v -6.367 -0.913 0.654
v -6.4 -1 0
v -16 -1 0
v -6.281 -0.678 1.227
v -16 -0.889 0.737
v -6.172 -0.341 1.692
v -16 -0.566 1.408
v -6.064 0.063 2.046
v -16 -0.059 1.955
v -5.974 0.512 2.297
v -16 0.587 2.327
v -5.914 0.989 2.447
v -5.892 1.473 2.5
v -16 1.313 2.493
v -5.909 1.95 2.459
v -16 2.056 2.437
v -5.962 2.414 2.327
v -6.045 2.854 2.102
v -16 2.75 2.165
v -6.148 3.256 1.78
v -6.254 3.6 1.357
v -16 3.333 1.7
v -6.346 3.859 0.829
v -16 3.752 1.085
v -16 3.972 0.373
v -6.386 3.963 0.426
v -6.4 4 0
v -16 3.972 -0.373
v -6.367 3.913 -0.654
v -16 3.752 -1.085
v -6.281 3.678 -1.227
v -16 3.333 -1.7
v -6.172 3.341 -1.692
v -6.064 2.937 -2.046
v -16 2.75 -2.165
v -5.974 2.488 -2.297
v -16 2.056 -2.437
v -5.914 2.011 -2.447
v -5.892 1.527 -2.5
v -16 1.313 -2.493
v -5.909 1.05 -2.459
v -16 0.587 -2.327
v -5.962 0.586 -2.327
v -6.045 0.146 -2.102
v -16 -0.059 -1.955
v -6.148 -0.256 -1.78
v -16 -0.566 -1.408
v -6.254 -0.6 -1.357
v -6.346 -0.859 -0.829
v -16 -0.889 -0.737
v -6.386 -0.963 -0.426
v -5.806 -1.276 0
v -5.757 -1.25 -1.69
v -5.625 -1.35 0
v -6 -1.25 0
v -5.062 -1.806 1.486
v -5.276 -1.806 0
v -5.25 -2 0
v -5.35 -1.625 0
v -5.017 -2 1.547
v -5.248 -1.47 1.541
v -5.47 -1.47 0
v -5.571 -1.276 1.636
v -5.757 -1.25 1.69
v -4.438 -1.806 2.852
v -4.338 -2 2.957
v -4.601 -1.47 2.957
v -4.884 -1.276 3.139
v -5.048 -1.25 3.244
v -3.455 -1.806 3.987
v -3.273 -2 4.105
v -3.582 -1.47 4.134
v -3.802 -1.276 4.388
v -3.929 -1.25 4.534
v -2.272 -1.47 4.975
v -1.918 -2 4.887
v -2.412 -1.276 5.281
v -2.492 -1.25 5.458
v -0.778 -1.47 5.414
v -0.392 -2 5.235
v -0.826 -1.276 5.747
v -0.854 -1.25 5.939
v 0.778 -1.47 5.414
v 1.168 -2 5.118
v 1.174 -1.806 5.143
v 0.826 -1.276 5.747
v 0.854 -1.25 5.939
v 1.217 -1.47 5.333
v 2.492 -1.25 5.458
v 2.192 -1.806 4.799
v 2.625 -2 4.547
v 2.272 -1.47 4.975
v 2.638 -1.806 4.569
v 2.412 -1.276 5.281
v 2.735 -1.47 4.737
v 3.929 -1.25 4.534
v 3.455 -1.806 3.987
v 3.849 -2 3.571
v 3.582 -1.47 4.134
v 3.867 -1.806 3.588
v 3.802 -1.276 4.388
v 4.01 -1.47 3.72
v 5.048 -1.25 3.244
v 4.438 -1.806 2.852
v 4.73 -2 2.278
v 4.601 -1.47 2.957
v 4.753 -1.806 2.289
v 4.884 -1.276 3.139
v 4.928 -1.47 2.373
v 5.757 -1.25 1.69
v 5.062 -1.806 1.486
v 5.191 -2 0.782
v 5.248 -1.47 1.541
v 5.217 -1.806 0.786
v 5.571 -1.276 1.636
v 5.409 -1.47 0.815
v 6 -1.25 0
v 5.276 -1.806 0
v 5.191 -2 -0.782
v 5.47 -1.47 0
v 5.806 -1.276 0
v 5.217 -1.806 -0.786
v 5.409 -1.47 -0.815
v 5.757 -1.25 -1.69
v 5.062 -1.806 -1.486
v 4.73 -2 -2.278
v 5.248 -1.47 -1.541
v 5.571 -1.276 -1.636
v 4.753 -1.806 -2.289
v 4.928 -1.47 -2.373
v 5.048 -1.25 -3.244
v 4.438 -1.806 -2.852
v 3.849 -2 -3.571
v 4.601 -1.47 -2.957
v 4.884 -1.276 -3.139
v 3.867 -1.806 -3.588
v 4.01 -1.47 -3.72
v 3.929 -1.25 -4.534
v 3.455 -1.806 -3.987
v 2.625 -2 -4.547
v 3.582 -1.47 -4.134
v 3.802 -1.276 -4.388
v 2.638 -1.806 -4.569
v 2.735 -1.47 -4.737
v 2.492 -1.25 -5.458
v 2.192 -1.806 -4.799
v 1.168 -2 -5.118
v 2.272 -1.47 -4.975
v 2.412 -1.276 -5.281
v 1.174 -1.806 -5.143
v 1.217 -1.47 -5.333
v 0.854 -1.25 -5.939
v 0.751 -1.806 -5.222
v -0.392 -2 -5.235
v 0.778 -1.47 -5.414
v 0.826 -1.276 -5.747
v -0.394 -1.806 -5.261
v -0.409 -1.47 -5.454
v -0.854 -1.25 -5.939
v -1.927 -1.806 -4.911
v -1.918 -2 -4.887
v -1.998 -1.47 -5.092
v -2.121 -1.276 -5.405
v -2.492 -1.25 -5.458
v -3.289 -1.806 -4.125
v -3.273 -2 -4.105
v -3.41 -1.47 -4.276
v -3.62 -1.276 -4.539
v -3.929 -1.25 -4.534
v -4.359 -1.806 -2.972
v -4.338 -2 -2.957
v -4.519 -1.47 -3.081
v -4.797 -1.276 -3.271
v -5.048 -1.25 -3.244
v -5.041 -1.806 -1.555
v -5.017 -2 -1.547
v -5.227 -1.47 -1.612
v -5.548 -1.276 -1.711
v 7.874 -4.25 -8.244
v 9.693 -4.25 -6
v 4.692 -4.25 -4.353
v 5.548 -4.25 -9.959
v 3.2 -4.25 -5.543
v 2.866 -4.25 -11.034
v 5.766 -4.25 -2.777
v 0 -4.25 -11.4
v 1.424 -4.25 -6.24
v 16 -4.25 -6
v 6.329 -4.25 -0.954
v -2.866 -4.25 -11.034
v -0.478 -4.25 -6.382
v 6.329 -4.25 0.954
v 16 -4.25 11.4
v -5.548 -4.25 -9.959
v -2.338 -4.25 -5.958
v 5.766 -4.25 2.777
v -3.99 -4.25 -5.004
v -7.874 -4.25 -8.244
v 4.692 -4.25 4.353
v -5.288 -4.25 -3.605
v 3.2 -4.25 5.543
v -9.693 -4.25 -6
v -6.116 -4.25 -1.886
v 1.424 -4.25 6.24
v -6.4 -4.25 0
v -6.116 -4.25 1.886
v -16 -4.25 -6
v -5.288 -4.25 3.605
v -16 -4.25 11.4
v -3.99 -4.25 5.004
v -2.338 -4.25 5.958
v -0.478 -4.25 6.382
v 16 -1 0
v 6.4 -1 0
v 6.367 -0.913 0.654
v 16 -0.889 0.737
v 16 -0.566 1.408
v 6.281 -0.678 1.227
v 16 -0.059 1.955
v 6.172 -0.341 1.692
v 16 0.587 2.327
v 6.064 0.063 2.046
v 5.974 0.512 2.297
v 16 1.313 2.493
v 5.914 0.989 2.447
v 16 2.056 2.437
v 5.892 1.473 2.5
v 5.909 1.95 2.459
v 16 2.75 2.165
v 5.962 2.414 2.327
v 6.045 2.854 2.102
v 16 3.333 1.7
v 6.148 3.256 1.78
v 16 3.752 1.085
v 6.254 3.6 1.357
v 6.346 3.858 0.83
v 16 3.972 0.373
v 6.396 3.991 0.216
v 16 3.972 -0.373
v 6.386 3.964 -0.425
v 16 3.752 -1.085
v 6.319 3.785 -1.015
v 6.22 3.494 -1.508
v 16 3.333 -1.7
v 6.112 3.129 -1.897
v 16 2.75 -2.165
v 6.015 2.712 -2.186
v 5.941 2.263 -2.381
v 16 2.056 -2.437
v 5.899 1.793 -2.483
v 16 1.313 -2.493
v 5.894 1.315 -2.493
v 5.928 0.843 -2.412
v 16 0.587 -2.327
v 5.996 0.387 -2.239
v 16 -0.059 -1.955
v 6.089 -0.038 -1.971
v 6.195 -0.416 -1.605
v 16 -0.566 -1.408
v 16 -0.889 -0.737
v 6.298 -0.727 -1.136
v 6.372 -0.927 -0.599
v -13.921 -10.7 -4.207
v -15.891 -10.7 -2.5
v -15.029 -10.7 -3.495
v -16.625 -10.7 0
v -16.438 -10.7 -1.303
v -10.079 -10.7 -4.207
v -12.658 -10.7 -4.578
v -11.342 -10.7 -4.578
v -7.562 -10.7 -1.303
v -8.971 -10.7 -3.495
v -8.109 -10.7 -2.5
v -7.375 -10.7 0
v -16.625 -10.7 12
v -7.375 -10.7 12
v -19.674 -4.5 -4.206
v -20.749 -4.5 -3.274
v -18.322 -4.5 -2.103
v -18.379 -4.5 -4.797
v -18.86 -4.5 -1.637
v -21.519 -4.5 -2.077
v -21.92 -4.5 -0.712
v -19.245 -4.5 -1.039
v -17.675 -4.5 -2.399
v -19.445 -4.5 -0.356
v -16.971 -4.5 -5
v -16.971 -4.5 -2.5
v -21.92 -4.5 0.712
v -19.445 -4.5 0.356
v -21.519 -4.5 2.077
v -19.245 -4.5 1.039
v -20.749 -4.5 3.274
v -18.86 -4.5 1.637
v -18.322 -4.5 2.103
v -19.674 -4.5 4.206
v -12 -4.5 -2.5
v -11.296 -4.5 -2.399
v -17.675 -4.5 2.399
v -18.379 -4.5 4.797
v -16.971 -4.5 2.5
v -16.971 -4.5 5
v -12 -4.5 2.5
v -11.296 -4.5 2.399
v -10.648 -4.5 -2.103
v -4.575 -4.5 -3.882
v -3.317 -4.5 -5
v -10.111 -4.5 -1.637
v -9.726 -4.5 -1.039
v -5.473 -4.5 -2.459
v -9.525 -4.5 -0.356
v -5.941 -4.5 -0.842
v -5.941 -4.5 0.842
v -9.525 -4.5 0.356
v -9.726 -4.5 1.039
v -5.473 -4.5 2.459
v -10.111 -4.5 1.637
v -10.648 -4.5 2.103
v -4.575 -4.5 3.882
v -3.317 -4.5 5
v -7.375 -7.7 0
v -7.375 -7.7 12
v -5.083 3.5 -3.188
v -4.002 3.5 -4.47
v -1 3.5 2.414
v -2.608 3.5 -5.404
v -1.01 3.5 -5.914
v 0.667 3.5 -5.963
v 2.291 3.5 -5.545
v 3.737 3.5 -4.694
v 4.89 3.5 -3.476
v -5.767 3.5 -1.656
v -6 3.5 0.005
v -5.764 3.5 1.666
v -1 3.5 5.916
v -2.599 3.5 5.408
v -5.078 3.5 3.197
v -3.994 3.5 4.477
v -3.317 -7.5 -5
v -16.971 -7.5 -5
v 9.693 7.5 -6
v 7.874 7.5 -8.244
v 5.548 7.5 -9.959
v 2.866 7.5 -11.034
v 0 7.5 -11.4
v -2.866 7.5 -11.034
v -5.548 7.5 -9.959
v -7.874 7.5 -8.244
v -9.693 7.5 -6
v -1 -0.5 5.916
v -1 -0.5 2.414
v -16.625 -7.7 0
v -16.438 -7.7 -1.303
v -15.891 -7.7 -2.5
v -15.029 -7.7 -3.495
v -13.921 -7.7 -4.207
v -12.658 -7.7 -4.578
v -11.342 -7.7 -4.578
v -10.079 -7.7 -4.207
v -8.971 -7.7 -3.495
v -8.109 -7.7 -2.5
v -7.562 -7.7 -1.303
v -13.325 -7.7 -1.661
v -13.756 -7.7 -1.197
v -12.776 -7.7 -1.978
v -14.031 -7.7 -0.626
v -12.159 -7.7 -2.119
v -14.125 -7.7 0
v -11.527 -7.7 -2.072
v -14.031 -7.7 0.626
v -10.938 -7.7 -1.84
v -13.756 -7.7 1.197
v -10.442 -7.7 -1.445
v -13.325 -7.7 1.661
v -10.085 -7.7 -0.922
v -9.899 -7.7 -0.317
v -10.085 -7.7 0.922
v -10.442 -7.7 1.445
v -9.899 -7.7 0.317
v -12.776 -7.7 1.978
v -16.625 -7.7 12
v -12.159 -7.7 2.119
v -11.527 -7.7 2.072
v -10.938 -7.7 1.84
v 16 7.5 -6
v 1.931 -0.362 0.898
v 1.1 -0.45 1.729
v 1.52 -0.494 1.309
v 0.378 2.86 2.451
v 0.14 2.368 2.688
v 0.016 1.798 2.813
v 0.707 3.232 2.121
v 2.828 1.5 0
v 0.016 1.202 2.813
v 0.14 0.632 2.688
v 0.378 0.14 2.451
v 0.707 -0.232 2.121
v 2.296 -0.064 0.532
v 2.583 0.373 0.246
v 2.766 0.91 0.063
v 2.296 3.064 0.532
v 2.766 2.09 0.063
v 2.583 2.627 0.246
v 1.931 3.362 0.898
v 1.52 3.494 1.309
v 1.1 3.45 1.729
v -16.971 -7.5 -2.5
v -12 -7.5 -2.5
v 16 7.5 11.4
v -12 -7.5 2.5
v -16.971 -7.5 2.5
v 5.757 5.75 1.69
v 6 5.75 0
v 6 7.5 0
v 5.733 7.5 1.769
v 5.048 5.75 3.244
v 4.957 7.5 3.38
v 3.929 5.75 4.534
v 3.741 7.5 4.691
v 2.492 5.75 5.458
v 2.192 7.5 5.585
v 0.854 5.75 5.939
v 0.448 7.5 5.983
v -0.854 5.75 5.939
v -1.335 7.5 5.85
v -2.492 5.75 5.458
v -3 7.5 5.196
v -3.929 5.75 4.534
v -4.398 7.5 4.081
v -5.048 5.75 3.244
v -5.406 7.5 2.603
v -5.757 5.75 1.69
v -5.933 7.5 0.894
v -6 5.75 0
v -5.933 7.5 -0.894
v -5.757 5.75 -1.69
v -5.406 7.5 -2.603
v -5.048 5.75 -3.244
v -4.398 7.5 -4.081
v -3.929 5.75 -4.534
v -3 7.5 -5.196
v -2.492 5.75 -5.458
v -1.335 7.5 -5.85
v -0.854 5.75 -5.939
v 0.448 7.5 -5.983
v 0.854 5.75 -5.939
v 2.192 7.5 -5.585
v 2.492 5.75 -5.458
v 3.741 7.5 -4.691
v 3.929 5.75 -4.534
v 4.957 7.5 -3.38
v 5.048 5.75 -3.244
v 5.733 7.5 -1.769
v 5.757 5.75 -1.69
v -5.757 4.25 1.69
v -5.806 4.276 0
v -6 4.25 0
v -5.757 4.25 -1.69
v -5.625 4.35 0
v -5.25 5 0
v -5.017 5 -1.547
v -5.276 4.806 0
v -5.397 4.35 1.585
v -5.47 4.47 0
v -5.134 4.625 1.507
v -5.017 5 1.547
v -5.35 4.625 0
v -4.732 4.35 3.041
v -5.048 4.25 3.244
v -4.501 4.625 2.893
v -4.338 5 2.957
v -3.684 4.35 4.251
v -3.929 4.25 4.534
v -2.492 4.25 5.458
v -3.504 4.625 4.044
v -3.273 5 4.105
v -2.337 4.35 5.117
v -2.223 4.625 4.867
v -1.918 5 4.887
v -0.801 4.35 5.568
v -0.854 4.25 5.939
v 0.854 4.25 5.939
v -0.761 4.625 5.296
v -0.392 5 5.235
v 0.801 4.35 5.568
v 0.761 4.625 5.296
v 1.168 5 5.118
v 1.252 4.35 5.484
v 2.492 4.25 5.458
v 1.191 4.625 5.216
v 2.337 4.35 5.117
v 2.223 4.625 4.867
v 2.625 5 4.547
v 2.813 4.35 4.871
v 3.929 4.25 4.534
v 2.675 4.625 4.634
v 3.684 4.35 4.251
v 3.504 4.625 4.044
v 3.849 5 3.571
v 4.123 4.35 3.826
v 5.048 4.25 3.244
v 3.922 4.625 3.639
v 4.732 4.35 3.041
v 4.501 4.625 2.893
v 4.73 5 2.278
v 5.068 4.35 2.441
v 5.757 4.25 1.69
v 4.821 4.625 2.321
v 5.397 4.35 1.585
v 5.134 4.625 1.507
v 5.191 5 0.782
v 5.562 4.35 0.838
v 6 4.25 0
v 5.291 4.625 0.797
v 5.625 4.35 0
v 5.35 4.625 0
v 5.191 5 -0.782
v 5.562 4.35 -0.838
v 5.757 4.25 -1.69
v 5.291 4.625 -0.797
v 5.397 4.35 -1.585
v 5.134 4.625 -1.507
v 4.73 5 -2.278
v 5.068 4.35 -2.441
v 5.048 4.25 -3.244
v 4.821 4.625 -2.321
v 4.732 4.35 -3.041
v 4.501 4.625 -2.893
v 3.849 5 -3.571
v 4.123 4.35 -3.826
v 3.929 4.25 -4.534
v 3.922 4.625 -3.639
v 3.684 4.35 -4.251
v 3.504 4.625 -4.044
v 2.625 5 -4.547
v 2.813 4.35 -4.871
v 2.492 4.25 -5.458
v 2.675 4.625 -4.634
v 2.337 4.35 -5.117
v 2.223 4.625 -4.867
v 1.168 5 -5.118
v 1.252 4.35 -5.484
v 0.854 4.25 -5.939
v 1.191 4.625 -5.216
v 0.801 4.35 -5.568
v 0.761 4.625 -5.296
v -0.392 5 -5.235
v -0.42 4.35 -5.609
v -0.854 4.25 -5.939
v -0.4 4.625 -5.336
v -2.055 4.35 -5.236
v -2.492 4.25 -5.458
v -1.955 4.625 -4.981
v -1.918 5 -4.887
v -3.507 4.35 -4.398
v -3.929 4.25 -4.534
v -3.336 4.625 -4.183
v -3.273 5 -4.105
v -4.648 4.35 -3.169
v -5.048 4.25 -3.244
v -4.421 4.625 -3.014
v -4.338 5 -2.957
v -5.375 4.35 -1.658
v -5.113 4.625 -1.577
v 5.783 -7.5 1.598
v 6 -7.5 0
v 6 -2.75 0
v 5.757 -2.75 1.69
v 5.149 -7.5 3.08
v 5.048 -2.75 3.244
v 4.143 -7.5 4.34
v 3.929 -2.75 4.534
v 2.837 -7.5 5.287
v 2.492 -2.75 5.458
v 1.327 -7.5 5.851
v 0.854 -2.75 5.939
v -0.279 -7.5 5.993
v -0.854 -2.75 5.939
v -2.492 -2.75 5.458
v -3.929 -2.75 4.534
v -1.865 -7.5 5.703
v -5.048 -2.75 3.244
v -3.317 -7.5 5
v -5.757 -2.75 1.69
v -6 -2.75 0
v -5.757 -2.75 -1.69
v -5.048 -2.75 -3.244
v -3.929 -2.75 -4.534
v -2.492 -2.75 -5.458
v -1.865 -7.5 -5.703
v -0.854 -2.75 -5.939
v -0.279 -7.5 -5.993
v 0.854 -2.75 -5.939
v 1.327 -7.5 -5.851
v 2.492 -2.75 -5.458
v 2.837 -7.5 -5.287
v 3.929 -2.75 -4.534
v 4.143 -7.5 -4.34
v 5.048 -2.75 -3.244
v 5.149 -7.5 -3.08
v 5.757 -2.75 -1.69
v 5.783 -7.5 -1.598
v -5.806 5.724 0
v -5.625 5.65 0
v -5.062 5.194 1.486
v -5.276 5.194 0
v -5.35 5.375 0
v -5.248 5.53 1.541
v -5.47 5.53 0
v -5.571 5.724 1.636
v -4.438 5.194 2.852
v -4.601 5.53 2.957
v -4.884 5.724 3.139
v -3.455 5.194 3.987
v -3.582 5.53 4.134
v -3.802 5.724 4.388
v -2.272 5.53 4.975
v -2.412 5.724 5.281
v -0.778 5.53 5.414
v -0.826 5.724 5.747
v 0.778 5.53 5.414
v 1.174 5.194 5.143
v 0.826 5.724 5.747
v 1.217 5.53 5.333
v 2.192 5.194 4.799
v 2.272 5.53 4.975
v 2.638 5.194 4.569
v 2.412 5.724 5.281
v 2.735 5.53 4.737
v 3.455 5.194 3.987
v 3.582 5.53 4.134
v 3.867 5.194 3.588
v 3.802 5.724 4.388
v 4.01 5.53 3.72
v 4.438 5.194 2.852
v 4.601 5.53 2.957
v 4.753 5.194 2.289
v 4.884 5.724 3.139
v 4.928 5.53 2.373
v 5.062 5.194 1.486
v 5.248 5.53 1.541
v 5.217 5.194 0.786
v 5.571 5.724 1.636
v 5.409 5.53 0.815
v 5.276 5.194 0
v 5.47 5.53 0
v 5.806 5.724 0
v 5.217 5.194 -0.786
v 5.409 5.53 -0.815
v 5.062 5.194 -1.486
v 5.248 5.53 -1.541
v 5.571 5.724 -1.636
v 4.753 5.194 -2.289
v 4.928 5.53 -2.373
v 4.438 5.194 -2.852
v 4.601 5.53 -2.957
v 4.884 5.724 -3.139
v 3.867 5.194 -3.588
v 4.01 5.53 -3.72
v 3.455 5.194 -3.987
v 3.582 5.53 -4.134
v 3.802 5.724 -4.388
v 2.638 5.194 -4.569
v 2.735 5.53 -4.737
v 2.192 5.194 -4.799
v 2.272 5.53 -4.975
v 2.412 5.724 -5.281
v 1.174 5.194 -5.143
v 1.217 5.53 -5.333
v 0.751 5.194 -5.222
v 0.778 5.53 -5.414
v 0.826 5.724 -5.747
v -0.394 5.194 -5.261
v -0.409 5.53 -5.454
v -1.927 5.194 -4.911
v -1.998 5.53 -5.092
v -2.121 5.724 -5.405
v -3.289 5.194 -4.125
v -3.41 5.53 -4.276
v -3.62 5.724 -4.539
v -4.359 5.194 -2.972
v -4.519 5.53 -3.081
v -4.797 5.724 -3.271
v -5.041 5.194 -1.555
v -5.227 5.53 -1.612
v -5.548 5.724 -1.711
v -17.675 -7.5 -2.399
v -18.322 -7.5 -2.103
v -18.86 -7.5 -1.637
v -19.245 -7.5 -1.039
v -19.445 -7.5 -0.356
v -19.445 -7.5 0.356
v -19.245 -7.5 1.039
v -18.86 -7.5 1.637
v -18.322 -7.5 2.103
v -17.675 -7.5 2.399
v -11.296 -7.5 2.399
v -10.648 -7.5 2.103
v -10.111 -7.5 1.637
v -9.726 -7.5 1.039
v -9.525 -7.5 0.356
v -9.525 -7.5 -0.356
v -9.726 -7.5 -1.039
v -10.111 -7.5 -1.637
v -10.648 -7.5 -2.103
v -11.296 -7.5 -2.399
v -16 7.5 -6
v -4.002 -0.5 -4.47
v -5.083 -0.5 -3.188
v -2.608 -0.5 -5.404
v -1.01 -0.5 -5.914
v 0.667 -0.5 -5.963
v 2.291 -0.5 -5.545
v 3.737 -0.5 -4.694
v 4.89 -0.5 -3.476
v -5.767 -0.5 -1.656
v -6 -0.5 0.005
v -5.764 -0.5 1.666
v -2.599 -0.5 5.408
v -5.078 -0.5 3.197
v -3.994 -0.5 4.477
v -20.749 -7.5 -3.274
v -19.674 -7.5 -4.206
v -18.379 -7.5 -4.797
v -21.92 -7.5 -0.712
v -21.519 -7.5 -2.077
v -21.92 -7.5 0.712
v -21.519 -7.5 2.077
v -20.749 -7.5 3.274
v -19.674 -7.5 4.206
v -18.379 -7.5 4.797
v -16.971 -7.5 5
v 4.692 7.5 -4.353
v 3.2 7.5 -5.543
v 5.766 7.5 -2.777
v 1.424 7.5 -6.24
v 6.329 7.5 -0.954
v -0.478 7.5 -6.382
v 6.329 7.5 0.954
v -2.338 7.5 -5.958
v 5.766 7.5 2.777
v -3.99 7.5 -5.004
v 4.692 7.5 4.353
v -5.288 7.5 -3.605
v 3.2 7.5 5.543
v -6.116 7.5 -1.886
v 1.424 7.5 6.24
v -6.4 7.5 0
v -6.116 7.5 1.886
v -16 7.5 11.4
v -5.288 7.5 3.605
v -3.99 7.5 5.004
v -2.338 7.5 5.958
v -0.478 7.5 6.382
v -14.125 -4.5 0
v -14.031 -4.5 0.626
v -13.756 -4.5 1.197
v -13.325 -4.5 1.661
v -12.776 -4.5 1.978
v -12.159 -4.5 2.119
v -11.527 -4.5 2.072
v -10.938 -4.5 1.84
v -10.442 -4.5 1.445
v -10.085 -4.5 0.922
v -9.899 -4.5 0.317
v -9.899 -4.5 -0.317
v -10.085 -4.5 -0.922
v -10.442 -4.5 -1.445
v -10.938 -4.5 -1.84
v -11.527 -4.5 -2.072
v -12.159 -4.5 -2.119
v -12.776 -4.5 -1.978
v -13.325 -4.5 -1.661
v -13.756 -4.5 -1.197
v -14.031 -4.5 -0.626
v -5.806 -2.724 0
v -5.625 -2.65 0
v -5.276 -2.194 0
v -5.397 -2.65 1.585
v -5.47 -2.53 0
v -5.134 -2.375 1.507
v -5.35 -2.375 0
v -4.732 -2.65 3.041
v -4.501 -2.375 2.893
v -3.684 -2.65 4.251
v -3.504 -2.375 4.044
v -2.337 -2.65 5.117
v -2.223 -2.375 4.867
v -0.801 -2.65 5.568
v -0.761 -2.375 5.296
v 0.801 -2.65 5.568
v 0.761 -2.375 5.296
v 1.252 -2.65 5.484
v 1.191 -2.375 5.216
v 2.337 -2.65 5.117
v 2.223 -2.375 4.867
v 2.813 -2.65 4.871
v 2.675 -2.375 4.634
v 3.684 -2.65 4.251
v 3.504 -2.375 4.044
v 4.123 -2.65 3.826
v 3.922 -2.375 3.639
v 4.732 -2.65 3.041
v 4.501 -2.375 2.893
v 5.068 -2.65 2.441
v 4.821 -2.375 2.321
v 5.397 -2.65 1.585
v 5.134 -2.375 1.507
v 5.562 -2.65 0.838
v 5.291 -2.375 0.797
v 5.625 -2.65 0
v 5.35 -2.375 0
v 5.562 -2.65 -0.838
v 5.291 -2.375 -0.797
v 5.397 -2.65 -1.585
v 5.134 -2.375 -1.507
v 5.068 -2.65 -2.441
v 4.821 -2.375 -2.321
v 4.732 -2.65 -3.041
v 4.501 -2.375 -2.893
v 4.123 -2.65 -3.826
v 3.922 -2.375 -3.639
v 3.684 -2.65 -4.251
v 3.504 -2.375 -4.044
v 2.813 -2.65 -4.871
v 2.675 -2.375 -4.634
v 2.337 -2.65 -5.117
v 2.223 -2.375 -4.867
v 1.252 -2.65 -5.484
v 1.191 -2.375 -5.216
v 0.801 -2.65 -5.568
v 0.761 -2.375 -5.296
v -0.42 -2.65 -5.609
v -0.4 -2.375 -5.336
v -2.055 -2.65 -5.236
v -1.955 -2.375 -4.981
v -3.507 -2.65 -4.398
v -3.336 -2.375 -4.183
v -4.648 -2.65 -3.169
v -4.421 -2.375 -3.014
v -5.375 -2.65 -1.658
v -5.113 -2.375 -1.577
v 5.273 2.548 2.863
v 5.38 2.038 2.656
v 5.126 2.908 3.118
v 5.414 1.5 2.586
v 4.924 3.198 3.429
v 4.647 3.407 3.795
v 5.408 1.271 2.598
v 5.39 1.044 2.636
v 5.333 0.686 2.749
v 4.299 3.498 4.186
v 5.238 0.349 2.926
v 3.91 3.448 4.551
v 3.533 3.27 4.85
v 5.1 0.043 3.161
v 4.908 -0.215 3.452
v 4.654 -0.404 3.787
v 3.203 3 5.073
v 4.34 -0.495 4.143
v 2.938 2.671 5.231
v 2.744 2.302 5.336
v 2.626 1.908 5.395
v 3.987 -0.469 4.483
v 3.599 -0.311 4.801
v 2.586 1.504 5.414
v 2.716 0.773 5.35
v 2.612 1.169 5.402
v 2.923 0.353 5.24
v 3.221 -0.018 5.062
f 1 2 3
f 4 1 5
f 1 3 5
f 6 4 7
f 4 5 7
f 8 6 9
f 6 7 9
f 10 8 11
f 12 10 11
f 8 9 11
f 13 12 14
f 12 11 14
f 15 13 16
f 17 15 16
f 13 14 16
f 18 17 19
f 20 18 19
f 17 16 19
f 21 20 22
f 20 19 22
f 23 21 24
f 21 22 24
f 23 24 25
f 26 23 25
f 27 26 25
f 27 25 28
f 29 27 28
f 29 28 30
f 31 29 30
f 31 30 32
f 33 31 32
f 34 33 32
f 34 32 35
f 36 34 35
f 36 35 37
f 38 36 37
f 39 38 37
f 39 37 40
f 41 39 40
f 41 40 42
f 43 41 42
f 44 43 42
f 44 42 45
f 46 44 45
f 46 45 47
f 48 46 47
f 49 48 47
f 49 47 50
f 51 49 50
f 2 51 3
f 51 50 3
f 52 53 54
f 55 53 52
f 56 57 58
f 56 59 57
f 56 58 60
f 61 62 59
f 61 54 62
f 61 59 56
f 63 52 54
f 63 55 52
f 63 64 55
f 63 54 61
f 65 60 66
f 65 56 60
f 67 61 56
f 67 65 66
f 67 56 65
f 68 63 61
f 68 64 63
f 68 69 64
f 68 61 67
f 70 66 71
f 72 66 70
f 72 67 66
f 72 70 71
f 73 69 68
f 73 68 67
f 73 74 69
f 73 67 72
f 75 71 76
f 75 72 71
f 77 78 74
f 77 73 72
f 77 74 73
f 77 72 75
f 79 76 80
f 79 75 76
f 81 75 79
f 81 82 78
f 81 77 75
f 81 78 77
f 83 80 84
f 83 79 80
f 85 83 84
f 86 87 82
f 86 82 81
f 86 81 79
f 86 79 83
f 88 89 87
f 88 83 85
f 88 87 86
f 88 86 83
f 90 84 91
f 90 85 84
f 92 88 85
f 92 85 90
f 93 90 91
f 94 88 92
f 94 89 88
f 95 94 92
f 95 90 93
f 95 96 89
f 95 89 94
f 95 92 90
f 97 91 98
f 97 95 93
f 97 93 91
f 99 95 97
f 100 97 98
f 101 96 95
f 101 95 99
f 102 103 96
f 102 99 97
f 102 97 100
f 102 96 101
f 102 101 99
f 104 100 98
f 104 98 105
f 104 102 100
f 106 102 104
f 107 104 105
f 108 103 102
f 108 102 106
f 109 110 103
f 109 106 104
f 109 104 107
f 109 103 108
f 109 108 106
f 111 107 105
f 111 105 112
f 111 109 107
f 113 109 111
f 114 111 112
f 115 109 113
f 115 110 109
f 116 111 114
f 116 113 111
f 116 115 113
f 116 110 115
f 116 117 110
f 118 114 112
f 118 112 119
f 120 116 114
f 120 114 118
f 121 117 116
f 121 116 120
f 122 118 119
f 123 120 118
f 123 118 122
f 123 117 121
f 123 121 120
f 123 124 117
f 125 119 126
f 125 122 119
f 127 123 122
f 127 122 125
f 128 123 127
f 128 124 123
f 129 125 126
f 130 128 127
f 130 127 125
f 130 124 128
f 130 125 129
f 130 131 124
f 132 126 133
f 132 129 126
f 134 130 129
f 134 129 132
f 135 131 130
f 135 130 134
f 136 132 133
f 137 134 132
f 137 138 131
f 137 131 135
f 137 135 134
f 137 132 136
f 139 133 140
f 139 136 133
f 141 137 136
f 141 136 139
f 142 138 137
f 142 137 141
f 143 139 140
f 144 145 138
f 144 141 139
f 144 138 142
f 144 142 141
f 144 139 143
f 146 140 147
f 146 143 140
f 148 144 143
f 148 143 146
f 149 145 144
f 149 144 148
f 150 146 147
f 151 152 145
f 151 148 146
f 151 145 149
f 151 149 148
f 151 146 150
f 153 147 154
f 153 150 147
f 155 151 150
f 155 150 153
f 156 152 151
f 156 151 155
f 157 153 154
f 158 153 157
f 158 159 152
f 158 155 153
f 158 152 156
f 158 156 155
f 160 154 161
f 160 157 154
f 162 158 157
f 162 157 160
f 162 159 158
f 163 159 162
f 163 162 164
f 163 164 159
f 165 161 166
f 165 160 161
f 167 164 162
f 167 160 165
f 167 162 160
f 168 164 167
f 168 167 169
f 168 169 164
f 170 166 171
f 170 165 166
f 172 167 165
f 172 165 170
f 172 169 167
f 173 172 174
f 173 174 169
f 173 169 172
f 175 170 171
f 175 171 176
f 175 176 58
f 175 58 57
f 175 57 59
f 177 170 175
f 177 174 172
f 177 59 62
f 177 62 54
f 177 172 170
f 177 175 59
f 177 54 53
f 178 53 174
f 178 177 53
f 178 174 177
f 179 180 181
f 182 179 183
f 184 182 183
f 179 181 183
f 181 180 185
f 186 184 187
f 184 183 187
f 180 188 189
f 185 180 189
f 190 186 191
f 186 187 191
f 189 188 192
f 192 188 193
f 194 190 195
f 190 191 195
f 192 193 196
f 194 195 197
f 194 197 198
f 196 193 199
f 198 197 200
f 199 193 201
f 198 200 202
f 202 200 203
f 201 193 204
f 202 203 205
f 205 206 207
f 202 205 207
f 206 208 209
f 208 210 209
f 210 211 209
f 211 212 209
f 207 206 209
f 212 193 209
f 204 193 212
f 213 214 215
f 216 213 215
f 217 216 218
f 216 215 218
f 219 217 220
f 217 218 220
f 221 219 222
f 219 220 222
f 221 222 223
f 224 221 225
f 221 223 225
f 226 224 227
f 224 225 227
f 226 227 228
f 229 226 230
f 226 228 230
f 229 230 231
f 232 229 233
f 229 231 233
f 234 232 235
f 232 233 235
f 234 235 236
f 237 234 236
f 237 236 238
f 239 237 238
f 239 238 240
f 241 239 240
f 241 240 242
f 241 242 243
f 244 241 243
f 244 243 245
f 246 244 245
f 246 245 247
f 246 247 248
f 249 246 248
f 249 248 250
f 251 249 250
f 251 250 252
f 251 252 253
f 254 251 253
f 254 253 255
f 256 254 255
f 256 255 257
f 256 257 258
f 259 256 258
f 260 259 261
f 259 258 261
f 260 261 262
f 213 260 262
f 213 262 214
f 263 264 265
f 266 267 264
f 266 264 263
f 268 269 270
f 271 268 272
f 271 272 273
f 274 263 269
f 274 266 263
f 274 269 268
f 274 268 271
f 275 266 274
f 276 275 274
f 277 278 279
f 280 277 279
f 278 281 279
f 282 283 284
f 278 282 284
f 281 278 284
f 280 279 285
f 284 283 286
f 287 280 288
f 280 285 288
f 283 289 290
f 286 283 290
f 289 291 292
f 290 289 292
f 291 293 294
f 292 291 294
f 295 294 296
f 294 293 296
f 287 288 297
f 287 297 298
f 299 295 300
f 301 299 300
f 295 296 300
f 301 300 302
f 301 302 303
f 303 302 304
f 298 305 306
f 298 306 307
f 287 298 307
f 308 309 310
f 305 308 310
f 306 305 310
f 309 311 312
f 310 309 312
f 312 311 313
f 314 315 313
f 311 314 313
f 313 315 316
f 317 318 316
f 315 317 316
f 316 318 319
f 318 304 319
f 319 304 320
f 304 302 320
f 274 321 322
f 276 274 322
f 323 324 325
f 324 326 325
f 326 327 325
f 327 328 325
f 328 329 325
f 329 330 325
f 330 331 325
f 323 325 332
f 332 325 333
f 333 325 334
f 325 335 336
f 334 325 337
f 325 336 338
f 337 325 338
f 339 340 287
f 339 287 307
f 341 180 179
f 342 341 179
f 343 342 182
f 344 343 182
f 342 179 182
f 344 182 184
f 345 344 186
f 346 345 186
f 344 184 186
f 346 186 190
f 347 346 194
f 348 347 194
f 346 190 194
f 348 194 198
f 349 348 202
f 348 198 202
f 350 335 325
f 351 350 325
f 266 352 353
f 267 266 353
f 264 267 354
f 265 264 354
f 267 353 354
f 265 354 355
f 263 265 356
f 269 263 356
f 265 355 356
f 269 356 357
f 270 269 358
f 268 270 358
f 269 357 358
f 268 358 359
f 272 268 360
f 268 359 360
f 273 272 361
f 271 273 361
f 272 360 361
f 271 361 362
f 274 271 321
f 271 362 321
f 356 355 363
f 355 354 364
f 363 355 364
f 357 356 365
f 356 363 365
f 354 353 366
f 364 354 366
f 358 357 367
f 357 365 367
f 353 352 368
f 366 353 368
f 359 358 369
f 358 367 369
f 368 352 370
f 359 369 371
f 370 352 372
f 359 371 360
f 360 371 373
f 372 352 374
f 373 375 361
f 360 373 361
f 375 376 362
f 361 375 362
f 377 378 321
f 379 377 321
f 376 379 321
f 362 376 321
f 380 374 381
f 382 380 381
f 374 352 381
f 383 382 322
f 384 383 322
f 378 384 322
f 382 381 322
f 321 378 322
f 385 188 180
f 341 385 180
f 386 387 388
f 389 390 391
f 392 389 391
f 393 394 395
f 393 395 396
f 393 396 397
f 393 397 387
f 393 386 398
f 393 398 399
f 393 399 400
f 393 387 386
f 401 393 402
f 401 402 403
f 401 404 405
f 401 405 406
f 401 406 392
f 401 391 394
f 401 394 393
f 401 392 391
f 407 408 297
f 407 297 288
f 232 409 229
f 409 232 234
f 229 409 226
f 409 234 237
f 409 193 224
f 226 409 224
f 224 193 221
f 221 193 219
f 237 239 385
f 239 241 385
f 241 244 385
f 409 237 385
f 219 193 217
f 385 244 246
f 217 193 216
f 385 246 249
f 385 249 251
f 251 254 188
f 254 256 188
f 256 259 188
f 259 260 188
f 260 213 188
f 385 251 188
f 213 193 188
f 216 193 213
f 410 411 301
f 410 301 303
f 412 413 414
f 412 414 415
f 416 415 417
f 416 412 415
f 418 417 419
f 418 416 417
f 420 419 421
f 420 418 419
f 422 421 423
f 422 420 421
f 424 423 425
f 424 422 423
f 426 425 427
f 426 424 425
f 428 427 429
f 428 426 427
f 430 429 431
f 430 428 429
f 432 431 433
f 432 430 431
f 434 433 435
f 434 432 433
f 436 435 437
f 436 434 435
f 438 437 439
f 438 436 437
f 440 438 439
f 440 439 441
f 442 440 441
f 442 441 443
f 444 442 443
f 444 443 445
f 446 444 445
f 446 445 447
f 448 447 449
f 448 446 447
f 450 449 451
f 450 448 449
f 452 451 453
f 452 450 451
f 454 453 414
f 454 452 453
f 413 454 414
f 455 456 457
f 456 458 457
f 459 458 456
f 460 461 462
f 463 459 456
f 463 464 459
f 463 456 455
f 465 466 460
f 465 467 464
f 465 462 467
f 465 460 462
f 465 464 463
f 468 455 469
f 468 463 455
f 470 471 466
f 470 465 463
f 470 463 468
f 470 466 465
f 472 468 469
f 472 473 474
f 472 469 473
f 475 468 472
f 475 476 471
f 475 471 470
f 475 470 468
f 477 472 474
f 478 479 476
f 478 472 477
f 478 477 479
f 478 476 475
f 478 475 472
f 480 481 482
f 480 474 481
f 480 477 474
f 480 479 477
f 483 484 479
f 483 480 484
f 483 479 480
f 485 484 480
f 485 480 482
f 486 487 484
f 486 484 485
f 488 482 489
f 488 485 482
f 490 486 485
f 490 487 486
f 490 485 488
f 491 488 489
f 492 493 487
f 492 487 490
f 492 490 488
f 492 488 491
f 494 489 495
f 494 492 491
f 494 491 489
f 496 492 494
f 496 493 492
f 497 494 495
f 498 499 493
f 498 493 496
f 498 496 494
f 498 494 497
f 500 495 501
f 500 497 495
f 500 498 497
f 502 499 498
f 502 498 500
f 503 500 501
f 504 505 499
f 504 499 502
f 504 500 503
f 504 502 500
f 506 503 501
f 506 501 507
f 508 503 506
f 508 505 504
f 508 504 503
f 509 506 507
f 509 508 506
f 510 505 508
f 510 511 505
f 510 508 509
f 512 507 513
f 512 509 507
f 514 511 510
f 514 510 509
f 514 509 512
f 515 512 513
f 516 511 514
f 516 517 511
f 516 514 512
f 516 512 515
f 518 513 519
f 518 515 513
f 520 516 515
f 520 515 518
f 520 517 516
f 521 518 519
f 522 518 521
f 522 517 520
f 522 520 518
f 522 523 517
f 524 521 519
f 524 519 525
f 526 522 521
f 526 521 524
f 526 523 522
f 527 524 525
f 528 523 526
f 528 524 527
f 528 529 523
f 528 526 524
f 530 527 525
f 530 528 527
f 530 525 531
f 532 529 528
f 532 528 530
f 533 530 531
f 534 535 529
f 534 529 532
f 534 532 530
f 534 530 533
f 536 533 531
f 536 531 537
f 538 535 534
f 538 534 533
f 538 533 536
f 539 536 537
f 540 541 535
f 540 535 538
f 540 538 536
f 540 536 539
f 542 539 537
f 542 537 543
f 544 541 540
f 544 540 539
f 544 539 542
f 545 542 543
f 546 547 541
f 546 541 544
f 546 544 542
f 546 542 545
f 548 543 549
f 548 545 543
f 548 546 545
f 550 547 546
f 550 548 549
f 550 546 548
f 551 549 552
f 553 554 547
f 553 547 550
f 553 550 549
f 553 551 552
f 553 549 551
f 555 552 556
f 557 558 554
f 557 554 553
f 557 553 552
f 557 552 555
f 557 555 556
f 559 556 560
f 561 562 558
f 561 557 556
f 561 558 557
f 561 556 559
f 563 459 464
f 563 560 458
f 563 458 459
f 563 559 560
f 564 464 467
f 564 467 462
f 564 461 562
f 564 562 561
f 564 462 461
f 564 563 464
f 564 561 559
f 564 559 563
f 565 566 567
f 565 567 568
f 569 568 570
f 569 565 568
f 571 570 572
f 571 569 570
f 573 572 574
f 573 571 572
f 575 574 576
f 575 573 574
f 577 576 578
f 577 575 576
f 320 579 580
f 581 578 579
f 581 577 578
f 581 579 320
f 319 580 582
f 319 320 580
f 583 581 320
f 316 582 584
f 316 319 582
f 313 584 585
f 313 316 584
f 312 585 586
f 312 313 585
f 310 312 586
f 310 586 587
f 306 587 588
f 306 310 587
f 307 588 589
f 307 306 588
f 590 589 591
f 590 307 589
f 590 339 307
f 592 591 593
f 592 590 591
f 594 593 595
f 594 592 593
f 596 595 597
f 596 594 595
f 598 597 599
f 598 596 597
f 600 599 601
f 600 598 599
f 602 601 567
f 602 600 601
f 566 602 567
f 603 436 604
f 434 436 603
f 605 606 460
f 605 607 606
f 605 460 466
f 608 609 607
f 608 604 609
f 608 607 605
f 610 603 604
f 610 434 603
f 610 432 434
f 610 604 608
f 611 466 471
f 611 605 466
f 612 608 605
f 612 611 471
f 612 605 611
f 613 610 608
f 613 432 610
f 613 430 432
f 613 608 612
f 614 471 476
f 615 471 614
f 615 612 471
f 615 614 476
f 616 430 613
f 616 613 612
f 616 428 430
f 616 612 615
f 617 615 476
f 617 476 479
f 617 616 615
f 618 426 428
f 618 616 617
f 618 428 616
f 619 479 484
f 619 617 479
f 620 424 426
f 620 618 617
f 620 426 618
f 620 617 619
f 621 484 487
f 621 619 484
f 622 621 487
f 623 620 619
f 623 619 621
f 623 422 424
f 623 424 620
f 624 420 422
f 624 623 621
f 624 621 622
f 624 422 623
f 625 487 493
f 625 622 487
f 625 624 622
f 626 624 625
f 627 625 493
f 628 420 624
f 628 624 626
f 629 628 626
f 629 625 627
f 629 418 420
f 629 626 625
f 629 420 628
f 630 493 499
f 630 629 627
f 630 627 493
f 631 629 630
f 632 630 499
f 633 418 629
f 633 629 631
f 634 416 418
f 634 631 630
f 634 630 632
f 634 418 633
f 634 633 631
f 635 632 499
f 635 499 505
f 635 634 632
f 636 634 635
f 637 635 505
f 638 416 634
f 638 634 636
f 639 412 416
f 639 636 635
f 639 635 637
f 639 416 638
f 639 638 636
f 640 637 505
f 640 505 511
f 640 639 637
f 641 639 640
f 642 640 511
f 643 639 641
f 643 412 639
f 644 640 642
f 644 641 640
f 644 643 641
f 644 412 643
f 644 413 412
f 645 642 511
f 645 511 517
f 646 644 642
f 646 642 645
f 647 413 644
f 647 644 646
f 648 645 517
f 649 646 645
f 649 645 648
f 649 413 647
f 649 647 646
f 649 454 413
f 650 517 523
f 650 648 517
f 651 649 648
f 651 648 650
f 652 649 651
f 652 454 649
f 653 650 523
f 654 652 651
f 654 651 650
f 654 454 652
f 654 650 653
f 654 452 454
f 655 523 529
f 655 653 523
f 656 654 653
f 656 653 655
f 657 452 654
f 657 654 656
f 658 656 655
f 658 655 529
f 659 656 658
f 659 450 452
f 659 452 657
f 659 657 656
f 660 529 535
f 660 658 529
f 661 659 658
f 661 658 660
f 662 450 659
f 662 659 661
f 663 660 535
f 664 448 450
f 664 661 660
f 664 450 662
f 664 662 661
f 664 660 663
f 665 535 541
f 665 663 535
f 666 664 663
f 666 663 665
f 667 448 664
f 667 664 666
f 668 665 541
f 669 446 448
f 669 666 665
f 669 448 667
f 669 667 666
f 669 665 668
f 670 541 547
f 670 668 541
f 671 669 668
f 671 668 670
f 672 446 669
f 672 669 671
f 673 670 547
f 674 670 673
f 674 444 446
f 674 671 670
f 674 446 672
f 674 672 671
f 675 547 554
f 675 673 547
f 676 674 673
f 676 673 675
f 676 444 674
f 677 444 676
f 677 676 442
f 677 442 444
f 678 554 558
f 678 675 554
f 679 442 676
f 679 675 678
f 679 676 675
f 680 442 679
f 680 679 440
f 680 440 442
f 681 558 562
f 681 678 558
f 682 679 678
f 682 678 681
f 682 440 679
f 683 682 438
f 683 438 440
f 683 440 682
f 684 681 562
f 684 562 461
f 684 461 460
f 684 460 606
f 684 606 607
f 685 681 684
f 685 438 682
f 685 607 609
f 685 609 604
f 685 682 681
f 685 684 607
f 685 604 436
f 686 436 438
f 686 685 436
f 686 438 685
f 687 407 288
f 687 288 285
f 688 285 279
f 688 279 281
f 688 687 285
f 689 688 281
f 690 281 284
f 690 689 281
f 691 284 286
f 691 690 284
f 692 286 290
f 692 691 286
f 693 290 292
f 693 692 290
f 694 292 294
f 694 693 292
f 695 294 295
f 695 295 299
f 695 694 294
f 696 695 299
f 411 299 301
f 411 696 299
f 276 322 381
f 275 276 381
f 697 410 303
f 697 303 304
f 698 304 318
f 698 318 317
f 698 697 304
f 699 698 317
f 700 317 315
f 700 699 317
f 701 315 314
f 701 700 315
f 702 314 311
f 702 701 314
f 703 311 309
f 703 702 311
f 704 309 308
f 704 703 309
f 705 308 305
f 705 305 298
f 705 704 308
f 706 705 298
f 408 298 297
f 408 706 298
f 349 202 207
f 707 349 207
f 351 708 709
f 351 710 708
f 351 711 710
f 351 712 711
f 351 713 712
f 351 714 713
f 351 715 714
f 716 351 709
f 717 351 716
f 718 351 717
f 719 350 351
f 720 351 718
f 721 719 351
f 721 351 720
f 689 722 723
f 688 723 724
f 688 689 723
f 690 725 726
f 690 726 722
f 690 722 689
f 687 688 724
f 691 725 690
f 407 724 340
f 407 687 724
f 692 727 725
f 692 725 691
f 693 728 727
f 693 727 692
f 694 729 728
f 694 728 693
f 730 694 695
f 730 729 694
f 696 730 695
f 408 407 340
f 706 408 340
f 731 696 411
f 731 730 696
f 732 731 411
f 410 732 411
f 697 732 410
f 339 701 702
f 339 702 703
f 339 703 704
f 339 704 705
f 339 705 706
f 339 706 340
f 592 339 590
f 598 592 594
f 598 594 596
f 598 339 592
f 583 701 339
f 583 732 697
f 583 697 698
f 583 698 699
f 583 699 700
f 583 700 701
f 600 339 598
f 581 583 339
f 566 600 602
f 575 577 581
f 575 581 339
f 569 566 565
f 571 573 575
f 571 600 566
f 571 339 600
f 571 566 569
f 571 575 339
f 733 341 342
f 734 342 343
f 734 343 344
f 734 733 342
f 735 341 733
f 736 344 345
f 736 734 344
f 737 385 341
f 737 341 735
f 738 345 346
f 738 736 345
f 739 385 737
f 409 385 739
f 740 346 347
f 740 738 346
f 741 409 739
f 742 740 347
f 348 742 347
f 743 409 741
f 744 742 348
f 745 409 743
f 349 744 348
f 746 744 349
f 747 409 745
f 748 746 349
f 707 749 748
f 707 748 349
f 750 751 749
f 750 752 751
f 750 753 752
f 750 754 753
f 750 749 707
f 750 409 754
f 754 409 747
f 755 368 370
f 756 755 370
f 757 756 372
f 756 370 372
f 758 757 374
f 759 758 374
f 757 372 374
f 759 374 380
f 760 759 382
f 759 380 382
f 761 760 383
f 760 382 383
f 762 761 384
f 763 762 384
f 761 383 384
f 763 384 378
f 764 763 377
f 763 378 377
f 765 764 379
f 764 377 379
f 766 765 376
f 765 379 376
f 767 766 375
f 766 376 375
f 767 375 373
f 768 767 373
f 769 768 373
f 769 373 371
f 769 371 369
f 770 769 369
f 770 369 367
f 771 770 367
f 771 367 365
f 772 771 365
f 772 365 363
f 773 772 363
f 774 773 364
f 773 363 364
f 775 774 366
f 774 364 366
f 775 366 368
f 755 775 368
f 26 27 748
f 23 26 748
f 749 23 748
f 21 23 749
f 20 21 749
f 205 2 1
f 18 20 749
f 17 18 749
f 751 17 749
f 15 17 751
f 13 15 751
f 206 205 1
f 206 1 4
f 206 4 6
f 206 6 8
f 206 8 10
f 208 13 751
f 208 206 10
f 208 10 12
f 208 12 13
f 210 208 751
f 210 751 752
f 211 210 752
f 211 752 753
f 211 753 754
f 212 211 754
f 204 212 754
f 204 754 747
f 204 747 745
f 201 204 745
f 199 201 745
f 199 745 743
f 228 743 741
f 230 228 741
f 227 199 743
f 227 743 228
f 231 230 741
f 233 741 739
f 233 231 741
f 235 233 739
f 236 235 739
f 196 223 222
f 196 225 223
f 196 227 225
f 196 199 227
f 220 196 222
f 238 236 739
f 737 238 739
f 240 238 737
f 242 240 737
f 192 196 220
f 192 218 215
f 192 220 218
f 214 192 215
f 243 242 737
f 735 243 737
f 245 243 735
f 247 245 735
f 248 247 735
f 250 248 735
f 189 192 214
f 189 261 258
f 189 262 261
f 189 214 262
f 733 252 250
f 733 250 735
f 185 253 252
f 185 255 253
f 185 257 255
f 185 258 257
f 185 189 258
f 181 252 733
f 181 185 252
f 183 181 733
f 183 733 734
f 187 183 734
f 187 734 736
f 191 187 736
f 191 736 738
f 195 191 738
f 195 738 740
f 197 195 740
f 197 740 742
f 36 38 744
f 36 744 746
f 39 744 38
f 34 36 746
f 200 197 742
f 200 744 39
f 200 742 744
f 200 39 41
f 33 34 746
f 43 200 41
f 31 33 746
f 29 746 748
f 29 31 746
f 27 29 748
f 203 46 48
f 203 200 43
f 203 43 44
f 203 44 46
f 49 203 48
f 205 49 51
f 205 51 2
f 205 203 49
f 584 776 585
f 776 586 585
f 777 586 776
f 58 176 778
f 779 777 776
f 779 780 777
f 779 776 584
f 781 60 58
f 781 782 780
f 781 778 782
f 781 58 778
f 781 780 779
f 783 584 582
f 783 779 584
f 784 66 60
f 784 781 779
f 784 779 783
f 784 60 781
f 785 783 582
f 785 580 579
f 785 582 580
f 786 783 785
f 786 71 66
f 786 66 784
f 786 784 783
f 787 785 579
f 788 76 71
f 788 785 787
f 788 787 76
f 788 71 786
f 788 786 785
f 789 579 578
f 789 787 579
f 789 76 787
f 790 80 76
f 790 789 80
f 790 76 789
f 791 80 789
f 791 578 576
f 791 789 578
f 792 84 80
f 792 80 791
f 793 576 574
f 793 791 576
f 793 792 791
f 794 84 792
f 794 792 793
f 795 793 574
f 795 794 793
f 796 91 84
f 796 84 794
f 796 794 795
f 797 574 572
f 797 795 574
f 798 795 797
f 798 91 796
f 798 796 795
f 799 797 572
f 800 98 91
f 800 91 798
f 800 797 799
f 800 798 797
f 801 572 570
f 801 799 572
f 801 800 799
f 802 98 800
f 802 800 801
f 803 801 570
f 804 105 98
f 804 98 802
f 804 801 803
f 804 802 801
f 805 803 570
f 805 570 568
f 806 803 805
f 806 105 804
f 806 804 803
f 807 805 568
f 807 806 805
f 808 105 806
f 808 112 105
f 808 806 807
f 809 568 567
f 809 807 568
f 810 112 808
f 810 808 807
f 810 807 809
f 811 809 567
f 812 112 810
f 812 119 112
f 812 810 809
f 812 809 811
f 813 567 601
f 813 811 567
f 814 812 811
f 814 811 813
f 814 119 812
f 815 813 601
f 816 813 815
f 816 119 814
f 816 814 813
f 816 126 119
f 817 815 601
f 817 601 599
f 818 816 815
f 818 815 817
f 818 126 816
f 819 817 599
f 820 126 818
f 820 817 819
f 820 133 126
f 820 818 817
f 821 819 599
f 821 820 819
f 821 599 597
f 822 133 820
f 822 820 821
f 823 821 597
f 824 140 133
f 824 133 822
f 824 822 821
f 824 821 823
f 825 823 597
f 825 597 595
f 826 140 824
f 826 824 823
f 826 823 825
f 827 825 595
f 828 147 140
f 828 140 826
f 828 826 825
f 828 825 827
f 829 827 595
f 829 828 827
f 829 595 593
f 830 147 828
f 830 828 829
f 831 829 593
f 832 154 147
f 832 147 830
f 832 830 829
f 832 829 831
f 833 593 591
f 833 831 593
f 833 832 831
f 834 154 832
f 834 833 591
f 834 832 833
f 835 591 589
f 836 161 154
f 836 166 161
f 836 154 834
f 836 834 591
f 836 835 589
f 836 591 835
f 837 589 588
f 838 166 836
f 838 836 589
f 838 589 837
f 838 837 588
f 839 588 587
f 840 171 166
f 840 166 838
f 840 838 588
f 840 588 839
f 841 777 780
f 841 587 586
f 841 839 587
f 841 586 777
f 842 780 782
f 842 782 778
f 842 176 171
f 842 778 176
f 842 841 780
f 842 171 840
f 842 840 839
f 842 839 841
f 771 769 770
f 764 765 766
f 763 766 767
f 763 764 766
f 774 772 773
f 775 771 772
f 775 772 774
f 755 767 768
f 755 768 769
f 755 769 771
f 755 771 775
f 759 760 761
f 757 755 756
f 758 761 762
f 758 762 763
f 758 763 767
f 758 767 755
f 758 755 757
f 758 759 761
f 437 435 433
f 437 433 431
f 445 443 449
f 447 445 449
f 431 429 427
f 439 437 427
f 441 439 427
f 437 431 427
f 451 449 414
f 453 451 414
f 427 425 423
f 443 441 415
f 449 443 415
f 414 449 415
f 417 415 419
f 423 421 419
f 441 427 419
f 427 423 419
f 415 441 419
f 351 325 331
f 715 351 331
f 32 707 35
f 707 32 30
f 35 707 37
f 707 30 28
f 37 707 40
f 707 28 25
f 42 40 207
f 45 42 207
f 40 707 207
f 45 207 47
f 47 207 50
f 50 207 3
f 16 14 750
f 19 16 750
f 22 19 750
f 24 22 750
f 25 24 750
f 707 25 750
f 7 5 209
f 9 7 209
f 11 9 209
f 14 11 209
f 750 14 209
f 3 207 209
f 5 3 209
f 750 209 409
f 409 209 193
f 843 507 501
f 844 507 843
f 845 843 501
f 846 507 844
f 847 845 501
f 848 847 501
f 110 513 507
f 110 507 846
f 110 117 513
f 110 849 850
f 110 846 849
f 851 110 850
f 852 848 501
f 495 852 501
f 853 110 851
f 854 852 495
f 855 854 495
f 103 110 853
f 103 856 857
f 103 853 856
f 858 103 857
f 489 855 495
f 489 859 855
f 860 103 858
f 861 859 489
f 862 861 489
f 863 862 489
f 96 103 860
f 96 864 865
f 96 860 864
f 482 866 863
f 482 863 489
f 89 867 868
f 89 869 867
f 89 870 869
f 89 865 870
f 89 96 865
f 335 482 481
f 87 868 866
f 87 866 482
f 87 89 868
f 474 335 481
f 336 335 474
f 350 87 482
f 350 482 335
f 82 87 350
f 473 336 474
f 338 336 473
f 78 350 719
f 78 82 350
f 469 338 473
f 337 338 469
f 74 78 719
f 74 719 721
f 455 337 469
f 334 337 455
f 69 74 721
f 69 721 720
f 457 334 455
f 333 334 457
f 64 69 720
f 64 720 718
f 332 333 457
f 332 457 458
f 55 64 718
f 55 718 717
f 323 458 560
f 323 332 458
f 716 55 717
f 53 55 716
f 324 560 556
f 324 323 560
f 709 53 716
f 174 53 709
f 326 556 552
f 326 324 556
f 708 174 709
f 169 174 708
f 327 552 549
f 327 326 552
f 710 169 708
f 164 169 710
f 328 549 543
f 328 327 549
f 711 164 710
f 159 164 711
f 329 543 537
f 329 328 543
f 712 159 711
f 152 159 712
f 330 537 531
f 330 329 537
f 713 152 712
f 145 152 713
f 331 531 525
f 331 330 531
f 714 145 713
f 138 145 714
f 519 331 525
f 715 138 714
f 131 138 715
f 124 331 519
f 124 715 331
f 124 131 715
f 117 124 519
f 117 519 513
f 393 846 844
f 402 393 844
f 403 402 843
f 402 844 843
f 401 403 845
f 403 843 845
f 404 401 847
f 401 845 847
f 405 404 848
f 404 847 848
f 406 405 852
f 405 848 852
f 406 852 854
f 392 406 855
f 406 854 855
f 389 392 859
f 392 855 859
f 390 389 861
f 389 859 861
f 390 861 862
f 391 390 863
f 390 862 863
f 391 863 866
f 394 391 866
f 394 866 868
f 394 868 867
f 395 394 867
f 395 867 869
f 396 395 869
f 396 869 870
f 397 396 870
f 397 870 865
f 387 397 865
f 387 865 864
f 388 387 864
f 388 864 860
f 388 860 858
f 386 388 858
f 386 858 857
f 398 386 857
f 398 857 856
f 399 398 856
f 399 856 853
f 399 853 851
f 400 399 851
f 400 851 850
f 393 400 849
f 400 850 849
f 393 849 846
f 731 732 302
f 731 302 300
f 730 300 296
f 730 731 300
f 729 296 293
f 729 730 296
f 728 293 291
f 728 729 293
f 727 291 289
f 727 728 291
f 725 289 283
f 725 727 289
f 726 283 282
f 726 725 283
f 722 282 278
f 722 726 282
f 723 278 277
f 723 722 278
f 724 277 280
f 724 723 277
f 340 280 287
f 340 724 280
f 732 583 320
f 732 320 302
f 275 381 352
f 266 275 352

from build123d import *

# Parameters (mm, degrees)
F0_R      = 6
F1_DEPTH  = 7.5
F4_DEPTH  = 3
F6_R      = 2
F9_DEPTH  = 14.9705627485
F10_R     = 0.75
F14_DEPTH = 3
F15_R     = 2.125
F16_DEPTH = 3.2
F19_DEPTH = 2
F21_R     = 6.4
F22_DEPTH = 11.75
F23_R     = 2.5
F24_DEPTH = 32.001


with BuildPart() as f1:
    # F0 (on Front) → F1 (new body, symmetric)
    with BuildSketch(Plane.XZ):
        Circle(F0_R)
    extrude(amount=F1_DEPTH, both=True)

    # F3 (on face) → F4 (join)
    with BuildSketch(Plane.XZ.offset(7.5)):
        with BuildLine():
            Line((-3.3166247904, 5), (-16.9705627485, 5))
            ThreePointArc((-16.9705627485, 5), (-21.9705627485, 0), (-16.9705627485, -5))
            Line((-16.9705627485, -5), (-3.3166247904, -5))
            ThreePointArc((-3.3166247904, -5), (-6, 0), (-3.3166247904, 5))
        make_face()
        with BuildLine():
            ThreePointArc((-16.9705627485, -2.5), (-19.4705627485, 0), (-16.9705627485, 2.5))
            Line((-16.9705627485, 2.5), (-12, 2.5))
            ThreePointArc((-12, 2.5), (-9.5, 0), (-12, -2.5))
            Line((-12, -2.5), (-16.9705627485, -2.5))
        make_face(mode=Mode.SUBTRACT)
    extrude(amount=-F4_DEPTH)

    # F6 (on line) → F9 (cut, through all)
    with BuildSketch(Plane(origin=(12, 0, 12), x_dir=(0.7071067812, 0, -0.7071067812), z_dir=(0.7071067812, 0, 0.7071067812))):
        with Locations((0, 1.5)):
            Circle(F6_R)
    extrude(amount=-F9_DEPTH, mode=Mode.SUBTRACT)

    # F10 (on Top) → F11 (revolve, cut)
    with BuildSketch(Plane.XY):
        with Locations((-6, 5)):
            Circle(F10_R)
        with Locations((-6, -2)):
            Circle(F10_R)
    revolve(axis=Axis((0, 3.3465889492, 0), (0, 1, 0)), mode=Mode.SUBTRACT)

    # F18 (on offset) → F19 (cut, symmetric)
    with BuildSketch(Plane(origin=(0, 1.5, 0), x_dir=(-1, 0, 0), z_dir=(0, 1, 0))):
        with BuildLine():
            ThreePointArc((-5.0695888728, -3.6553753105), (5.3171741035, -3.2848378275), (1, 6.1694813396))
            Line((1, 6.1694813396), (1, 2.4142135624))
            Line((1, 2.4142135624), (-5.0695888728, -3.6553753105))
        make_face()
    extrude(amount=F19_DEPTH, both=True, mode=Mode.SUBTRACT)


with BuildPart() as f14:
    # F13 (on offset) → F14 (new body)
    with BuildSketch(Plane.XZ.offset(7.7)):
        with BuildLine():
            Line((-7.375, 12), (-16.625, 12))
            Line((-16.625, 12), (-16.625, 0))
            ThreePointArc((-16.625, 0), (-12, -4.625), (-7.375, 0))
            Line((-7.375, 0), (-7.375, 12))
        make_face()
    extrude(amount=F14_DEPTH)

    # F15 (on face) → F16 (join)
    with BuildSketch(Plane(origin=(0, -7.7, 0), x_dir=(-1, 0, 0), z_dir=(0, 1, 0))):
        with Locations((12, 0)):
            Circle(F15_R)
    extrude(amount=F16_DEPTH)


with BuildPart() as f22:
    # F21 (on offset) → F22 (new body, through all)
    with BuildSketch(Plane(origin=(0, -4.25, 0), x_dir=(-1, 0, 0), z_dir=(0, 1, 0))):
        with BuildLine():
            Line((16, 11.4), (-16, 11.4))
            Line((-16, 11.4), (-16, -6))
            Line((-16, -6), (-9.6932966528, -6))
            ThreePointArc((-9.6932966528, -6), (0, -11.4), (9.6932966528, -6))
            Line((9.6932966528, -6), (16, -6))
            Line((16, -6), (16, 11.4))
        make_face()
        Circle(F21_R, mode=Mode.SUBTRACT)
    extrude(amount=F22_DEPTH)

    # F23 (on face) → F24 (cut, through all)
    with BuildSketch(Plane(origin=(-16, 0, 0), x_dir=(0, -1, 0), z_dir=(-1, 0, 0))):
        with Locations((-1.5, 0)):
            Circle(F23_R)
    extrude(amount=-F24_DEPTH, mode=Mode.SUBTRACT)


solid = Compound([f1.part, f14.part, f22.part])
